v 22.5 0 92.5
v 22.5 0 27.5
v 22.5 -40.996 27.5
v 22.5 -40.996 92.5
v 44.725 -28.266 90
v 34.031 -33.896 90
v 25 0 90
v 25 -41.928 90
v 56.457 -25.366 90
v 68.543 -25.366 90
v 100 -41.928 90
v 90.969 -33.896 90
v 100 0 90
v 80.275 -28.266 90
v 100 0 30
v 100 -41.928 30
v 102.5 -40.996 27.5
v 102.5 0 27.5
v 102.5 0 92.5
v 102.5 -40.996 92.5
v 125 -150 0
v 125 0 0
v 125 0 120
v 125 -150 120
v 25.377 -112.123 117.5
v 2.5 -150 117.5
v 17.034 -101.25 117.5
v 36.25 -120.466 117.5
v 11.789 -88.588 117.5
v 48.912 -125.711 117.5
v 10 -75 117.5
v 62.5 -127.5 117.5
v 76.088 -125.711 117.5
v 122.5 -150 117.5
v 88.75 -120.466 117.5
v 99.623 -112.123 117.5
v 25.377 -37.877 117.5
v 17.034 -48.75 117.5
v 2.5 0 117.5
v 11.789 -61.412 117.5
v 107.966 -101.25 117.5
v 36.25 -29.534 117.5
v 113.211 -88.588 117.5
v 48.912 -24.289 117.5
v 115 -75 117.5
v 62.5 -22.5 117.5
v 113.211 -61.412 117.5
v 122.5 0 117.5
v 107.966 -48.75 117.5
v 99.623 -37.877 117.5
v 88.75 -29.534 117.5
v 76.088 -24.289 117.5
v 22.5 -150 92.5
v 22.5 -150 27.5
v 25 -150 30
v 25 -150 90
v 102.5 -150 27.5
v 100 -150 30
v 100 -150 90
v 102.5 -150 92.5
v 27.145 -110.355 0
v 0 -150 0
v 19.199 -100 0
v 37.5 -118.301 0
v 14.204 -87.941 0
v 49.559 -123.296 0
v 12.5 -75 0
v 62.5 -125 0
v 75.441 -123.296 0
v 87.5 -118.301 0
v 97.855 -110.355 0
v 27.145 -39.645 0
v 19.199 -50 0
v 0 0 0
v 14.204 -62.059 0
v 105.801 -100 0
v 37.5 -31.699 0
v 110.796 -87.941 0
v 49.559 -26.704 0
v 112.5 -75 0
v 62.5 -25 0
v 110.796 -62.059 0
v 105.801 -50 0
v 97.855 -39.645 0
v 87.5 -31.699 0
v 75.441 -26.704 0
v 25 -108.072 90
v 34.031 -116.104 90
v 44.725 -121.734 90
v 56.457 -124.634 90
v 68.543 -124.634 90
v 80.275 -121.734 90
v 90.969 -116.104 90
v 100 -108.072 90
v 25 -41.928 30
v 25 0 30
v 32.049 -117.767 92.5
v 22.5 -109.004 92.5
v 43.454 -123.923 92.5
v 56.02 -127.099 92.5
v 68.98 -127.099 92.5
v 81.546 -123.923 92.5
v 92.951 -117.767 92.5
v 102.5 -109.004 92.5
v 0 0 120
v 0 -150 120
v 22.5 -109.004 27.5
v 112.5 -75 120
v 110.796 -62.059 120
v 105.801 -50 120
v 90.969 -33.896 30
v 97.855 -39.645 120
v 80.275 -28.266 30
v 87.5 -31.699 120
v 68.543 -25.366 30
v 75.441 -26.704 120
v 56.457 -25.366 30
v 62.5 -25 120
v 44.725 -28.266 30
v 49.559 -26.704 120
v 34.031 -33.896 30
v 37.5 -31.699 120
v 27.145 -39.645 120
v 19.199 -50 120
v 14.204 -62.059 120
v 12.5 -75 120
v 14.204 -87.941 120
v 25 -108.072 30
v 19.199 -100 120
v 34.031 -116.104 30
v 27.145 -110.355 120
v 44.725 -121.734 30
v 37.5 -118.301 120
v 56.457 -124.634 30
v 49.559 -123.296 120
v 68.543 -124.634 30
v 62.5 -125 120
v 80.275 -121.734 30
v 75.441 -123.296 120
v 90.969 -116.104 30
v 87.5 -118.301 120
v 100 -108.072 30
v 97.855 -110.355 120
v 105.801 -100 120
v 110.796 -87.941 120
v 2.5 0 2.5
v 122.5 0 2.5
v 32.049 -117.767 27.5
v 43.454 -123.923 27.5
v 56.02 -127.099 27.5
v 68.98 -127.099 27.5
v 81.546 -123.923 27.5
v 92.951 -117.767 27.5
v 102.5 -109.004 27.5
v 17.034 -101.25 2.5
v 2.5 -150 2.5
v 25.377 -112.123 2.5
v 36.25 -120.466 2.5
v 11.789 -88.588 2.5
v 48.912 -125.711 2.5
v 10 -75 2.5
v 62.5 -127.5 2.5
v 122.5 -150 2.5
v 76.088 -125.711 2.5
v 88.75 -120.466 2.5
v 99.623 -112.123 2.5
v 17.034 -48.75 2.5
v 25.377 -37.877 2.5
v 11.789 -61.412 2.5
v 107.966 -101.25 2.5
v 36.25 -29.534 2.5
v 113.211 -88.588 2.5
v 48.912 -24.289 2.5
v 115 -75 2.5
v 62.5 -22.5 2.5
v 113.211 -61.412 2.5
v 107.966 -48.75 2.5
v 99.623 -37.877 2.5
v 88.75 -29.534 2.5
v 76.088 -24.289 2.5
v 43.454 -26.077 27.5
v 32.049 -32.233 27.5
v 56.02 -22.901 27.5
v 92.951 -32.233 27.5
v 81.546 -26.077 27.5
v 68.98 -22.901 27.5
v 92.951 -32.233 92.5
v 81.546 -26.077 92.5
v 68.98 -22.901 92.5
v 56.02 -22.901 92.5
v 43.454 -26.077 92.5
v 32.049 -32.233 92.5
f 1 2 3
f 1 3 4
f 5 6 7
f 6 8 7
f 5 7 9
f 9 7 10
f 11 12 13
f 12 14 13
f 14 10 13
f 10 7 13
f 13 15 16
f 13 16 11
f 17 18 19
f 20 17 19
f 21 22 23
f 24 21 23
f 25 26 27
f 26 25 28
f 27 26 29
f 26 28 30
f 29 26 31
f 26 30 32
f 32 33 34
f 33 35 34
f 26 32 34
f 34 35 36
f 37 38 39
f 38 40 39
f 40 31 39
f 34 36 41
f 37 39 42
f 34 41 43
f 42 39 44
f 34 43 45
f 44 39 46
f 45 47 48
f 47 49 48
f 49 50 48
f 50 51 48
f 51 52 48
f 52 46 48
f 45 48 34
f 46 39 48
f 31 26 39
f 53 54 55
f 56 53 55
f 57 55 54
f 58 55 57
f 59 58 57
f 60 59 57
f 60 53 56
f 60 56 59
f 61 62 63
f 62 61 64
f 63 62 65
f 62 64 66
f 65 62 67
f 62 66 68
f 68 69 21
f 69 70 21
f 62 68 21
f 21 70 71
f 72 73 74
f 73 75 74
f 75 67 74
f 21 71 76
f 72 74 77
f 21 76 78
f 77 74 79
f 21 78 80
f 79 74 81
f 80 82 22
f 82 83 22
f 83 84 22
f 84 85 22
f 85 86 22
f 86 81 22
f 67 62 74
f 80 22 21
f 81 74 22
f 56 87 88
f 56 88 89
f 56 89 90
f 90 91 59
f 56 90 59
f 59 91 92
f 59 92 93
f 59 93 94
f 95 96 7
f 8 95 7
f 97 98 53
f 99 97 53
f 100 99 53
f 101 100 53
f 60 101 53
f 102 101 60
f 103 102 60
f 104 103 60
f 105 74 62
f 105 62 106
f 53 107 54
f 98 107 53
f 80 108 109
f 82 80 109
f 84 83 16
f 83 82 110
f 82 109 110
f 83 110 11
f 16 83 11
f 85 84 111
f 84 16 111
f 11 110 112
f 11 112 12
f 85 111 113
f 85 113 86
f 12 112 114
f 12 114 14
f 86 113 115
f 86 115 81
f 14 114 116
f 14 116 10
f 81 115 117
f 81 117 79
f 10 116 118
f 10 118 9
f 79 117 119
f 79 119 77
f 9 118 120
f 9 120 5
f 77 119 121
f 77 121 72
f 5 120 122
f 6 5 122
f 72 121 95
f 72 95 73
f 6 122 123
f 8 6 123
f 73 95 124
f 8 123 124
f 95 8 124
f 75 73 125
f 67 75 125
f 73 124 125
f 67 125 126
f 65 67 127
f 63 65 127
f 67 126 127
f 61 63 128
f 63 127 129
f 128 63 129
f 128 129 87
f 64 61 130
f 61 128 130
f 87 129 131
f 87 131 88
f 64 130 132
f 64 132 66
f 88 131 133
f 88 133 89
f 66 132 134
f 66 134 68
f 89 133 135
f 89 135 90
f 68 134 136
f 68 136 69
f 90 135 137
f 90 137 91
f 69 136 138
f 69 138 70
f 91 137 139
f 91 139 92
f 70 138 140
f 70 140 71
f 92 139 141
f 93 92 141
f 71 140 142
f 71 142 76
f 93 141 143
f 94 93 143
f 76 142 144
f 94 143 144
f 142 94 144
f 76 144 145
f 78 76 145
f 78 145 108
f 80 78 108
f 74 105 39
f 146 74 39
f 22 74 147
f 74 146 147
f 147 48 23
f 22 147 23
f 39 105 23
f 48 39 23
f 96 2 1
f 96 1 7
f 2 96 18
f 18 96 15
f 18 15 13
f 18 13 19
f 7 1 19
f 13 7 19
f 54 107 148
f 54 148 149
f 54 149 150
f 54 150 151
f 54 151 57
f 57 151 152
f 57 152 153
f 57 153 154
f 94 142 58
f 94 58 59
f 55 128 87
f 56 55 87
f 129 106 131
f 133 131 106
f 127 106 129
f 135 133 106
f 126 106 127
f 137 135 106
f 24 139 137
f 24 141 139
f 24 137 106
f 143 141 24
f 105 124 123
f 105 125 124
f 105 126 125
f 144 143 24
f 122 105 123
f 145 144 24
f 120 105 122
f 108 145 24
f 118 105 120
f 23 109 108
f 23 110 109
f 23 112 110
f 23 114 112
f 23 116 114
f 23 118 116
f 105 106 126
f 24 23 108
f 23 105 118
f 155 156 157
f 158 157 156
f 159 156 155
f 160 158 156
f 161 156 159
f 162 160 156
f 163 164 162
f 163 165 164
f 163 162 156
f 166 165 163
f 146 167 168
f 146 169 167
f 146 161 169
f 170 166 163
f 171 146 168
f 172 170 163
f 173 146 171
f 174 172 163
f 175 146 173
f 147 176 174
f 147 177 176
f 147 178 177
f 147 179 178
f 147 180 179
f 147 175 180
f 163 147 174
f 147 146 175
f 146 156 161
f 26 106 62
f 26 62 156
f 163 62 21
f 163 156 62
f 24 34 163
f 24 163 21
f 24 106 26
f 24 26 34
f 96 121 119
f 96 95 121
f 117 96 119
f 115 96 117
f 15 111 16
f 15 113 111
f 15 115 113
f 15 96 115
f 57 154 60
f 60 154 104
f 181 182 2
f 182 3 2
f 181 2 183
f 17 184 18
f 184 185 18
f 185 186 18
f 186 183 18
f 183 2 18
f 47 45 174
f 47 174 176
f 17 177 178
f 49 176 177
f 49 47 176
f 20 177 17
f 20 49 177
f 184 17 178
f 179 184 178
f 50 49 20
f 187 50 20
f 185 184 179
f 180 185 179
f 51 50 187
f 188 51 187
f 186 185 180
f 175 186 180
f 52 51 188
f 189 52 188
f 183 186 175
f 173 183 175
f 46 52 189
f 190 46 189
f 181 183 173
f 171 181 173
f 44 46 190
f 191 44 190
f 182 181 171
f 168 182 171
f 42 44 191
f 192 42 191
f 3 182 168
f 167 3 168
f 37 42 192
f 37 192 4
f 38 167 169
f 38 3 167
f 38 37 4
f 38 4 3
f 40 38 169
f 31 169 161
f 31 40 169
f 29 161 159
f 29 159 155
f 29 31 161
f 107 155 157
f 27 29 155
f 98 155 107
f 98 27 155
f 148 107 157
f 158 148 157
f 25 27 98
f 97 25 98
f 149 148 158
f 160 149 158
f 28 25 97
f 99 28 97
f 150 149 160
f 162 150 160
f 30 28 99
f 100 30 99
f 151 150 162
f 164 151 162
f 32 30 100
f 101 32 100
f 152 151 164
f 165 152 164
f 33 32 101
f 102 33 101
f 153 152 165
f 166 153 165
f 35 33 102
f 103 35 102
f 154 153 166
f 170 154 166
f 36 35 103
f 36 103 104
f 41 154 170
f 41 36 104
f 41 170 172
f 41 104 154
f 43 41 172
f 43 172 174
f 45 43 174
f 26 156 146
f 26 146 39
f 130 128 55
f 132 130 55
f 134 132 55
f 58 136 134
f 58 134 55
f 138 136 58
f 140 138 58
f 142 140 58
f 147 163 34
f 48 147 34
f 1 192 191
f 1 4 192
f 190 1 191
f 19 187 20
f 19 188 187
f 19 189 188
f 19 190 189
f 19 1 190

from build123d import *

# Parameters (mm, degrees)
F0_W     = 125
F0_H     = 120
F0_W_2   = 75
F0_H_2   = 60
F1_DEPTH = 150
F2_R     = 50
F3_DEPTH = 120.001
F4_T     = -2.5


with BuildPart() as f1:
    # F0 (on Front) → F1 (new body)
    with BuildSketch(Plane.XZ):
        with Locations((62.5, 60)):
            Rectangle(F0_W, F0_H)
        with Locations((62.5, 60)):
            Rectangle(F0_W_2, F0_H_2, mode=Mode.SUBTRACT)
    extrude(amount=F1_DEPTH)

    # F2 (on face) → F3 (cut, through all)
    with BuildSketch(Plane.XY.offset(120)):
        with Locations((62.5, -75)):
            Circle(F2_R)
    extrude(amount=-F3_DEPTH, mode=Mode.SUBTRACT)

    # F4
    f4_openings = [f1.faces().sort_by_distance(p)[0] for p in [
        (1.732772, -150, 60),
        (1.732772, 0, 60),
    ]]
    offset(amount=F4_T, openings=f4_openings, kind=Kind.INTERSECTION)


solid = f1.part
